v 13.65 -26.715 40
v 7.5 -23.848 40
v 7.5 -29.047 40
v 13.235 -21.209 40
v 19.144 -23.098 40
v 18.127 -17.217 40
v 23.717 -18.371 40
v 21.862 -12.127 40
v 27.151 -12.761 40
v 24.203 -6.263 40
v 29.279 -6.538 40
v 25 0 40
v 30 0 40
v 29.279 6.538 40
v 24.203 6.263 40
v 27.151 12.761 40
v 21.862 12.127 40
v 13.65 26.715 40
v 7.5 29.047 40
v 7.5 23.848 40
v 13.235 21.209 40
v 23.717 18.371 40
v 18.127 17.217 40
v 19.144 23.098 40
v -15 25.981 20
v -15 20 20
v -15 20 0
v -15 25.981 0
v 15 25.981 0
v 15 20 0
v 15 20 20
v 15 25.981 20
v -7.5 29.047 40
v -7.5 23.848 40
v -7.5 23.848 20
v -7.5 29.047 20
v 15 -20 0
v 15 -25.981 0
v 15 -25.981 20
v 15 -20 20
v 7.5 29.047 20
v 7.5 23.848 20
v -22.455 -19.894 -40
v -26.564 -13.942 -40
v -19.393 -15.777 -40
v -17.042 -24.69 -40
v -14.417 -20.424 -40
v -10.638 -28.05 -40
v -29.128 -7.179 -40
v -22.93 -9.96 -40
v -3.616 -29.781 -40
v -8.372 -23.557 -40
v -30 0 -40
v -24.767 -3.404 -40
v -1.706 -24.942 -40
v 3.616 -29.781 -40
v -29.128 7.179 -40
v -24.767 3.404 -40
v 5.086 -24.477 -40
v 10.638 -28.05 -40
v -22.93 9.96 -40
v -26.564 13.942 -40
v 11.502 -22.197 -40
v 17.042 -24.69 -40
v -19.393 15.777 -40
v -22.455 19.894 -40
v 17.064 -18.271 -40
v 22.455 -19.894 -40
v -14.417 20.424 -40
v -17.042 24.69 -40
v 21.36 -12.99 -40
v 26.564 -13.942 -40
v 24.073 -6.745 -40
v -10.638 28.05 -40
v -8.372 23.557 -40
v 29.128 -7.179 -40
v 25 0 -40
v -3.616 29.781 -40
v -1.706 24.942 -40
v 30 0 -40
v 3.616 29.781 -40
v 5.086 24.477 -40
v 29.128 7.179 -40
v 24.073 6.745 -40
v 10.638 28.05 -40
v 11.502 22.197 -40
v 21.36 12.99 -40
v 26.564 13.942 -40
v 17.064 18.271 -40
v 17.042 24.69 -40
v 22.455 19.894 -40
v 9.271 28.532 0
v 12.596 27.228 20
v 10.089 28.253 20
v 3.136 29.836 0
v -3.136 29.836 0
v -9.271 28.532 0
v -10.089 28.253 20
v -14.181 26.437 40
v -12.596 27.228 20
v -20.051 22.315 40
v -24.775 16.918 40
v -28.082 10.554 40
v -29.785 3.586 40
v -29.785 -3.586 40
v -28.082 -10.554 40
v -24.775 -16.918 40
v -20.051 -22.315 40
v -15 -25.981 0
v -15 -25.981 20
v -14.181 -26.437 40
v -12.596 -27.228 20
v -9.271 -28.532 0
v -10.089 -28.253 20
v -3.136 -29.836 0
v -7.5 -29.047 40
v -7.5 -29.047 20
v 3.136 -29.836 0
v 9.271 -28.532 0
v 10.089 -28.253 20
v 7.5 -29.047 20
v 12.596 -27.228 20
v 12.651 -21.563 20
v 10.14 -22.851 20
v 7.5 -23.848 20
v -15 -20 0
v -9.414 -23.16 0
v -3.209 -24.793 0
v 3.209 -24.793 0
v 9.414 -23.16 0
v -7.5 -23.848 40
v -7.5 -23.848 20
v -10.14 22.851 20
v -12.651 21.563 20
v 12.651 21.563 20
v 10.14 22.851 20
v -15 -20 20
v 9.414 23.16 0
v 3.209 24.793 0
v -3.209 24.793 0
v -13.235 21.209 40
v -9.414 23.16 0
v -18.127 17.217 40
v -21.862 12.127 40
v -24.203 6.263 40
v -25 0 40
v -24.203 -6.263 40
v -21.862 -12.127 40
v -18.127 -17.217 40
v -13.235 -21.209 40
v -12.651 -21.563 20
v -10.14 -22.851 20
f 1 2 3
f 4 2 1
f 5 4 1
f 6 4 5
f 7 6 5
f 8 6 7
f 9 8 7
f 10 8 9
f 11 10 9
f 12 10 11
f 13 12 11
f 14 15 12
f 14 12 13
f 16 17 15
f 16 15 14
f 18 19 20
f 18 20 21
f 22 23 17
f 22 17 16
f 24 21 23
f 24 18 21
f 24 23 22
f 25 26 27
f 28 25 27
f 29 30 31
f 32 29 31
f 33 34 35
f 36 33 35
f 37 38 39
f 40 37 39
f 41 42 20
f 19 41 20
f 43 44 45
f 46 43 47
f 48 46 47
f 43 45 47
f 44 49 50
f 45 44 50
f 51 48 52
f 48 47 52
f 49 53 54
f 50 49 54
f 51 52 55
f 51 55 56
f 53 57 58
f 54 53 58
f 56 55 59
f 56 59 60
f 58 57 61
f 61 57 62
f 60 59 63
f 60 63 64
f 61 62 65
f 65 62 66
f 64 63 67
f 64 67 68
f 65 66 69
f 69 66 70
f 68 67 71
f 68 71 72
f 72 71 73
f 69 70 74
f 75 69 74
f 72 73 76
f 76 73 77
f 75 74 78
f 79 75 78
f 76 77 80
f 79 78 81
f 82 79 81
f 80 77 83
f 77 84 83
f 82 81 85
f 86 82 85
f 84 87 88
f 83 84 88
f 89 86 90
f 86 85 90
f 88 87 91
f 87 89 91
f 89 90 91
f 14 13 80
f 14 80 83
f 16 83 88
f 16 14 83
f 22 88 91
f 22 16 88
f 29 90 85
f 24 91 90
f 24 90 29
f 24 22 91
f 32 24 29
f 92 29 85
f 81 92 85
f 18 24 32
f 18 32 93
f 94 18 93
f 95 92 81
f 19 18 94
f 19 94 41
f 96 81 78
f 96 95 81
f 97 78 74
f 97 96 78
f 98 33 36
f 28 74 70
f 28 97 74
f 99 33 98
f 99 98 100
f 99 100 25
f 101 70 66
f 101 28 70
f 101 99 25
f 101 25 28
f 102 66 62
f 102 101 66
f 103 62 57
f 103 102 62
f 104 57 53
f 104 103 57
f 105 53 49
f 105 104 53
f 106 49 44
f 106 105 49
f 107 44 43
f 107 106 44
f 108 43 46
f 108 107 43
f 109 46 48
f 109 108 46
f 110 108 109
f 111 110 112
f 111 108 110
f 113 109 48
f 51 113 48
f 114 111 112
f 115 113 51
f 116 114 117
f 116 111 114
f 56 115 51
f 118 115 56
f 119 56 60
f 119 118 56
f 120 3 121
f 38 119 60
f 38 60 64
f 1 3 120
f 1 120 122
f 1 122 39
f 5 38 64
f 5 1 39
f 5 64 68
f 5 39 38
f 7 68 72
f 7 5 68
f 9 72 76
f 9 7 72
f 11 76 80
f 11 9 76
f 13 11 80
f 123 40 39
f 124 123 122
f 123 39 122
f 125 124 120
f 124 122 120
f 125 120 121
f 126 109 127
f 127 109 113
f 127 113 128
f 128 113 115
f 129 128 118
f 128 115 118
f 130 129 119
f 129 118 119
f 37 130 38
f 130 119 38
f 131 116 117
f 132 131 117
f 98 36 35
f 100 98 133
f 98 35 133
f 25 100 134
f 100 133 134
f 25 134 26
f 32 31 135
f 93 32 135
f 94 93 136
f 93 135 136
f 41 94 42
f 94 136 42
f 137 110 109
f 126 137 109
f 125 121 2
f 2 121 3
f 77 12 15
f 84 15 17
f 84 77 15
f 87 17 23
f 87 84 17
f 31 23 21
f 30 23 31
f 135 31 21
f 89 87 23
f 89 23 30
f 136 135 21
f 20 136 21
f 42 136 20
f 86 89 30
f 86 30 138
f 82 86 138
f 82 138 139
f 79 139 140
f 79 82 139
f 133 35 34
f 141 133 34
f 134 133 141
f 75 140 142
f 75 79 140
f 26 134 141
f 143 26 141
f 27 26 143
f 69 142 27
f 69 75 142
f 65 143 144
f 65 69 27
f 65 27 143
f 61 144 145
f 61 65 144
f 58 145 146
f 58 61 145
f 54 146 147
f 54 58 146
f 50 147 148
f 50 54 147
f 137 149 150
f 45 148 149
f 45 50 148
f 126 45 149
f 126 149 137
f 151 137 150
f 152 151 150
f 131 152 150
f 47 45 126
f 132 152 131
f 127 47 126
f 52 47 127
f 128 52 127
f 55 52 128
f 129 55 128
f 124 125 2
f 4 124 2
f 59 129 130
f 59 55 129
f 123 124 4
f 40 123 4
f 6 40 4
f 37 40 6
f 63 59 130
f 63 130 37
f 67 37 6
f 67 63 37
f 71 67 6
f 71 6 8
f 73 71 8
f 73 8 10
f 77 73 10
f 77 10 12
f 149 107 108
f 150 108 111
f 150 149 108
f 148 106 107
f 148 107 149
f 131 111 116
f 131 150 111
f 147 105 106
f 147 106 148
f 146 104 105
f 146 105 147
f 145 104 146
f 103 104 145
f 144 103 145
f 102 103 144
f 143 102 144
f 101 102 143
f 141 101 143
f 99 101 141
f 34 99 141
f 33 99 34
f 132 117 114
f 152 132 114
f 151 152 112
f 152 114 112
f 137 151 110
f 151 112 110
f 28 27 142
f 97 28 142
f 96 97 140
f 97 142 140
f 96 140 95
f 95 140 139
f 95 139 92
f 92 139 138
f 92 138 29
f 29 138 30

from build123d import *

# Parameters (mm, degrees)
F0_R     = 30
F0_R_2   = 25
F1_DEPTH = 40
F3_DEPTH = 52.8


with BuildPart() as f1:
    # F0 (on Top) → F1 (new body, symmetric)
    with BuildSketch(Plane.XY):
        Circle(F0_R)
        Circle(F0_R_2, mode=Mode.SUBTRACT)
    extrude(amount=F1_DEPTH, both=True)

    # F2 (on Front) → F3 (cut, symmetric)
    with BuildSketch(Plane.XZ):
        Polygon((7.5, 40), (-7.5, 40), (-7.5, 20), (-15, 20), (-15, 0), (15, 0), (15, 20), (7.5, 20), align=None)
    extrude(amount=F3_DEPTH, both=True, mode=Mode.SUBTRACT)


solid = f1.part
